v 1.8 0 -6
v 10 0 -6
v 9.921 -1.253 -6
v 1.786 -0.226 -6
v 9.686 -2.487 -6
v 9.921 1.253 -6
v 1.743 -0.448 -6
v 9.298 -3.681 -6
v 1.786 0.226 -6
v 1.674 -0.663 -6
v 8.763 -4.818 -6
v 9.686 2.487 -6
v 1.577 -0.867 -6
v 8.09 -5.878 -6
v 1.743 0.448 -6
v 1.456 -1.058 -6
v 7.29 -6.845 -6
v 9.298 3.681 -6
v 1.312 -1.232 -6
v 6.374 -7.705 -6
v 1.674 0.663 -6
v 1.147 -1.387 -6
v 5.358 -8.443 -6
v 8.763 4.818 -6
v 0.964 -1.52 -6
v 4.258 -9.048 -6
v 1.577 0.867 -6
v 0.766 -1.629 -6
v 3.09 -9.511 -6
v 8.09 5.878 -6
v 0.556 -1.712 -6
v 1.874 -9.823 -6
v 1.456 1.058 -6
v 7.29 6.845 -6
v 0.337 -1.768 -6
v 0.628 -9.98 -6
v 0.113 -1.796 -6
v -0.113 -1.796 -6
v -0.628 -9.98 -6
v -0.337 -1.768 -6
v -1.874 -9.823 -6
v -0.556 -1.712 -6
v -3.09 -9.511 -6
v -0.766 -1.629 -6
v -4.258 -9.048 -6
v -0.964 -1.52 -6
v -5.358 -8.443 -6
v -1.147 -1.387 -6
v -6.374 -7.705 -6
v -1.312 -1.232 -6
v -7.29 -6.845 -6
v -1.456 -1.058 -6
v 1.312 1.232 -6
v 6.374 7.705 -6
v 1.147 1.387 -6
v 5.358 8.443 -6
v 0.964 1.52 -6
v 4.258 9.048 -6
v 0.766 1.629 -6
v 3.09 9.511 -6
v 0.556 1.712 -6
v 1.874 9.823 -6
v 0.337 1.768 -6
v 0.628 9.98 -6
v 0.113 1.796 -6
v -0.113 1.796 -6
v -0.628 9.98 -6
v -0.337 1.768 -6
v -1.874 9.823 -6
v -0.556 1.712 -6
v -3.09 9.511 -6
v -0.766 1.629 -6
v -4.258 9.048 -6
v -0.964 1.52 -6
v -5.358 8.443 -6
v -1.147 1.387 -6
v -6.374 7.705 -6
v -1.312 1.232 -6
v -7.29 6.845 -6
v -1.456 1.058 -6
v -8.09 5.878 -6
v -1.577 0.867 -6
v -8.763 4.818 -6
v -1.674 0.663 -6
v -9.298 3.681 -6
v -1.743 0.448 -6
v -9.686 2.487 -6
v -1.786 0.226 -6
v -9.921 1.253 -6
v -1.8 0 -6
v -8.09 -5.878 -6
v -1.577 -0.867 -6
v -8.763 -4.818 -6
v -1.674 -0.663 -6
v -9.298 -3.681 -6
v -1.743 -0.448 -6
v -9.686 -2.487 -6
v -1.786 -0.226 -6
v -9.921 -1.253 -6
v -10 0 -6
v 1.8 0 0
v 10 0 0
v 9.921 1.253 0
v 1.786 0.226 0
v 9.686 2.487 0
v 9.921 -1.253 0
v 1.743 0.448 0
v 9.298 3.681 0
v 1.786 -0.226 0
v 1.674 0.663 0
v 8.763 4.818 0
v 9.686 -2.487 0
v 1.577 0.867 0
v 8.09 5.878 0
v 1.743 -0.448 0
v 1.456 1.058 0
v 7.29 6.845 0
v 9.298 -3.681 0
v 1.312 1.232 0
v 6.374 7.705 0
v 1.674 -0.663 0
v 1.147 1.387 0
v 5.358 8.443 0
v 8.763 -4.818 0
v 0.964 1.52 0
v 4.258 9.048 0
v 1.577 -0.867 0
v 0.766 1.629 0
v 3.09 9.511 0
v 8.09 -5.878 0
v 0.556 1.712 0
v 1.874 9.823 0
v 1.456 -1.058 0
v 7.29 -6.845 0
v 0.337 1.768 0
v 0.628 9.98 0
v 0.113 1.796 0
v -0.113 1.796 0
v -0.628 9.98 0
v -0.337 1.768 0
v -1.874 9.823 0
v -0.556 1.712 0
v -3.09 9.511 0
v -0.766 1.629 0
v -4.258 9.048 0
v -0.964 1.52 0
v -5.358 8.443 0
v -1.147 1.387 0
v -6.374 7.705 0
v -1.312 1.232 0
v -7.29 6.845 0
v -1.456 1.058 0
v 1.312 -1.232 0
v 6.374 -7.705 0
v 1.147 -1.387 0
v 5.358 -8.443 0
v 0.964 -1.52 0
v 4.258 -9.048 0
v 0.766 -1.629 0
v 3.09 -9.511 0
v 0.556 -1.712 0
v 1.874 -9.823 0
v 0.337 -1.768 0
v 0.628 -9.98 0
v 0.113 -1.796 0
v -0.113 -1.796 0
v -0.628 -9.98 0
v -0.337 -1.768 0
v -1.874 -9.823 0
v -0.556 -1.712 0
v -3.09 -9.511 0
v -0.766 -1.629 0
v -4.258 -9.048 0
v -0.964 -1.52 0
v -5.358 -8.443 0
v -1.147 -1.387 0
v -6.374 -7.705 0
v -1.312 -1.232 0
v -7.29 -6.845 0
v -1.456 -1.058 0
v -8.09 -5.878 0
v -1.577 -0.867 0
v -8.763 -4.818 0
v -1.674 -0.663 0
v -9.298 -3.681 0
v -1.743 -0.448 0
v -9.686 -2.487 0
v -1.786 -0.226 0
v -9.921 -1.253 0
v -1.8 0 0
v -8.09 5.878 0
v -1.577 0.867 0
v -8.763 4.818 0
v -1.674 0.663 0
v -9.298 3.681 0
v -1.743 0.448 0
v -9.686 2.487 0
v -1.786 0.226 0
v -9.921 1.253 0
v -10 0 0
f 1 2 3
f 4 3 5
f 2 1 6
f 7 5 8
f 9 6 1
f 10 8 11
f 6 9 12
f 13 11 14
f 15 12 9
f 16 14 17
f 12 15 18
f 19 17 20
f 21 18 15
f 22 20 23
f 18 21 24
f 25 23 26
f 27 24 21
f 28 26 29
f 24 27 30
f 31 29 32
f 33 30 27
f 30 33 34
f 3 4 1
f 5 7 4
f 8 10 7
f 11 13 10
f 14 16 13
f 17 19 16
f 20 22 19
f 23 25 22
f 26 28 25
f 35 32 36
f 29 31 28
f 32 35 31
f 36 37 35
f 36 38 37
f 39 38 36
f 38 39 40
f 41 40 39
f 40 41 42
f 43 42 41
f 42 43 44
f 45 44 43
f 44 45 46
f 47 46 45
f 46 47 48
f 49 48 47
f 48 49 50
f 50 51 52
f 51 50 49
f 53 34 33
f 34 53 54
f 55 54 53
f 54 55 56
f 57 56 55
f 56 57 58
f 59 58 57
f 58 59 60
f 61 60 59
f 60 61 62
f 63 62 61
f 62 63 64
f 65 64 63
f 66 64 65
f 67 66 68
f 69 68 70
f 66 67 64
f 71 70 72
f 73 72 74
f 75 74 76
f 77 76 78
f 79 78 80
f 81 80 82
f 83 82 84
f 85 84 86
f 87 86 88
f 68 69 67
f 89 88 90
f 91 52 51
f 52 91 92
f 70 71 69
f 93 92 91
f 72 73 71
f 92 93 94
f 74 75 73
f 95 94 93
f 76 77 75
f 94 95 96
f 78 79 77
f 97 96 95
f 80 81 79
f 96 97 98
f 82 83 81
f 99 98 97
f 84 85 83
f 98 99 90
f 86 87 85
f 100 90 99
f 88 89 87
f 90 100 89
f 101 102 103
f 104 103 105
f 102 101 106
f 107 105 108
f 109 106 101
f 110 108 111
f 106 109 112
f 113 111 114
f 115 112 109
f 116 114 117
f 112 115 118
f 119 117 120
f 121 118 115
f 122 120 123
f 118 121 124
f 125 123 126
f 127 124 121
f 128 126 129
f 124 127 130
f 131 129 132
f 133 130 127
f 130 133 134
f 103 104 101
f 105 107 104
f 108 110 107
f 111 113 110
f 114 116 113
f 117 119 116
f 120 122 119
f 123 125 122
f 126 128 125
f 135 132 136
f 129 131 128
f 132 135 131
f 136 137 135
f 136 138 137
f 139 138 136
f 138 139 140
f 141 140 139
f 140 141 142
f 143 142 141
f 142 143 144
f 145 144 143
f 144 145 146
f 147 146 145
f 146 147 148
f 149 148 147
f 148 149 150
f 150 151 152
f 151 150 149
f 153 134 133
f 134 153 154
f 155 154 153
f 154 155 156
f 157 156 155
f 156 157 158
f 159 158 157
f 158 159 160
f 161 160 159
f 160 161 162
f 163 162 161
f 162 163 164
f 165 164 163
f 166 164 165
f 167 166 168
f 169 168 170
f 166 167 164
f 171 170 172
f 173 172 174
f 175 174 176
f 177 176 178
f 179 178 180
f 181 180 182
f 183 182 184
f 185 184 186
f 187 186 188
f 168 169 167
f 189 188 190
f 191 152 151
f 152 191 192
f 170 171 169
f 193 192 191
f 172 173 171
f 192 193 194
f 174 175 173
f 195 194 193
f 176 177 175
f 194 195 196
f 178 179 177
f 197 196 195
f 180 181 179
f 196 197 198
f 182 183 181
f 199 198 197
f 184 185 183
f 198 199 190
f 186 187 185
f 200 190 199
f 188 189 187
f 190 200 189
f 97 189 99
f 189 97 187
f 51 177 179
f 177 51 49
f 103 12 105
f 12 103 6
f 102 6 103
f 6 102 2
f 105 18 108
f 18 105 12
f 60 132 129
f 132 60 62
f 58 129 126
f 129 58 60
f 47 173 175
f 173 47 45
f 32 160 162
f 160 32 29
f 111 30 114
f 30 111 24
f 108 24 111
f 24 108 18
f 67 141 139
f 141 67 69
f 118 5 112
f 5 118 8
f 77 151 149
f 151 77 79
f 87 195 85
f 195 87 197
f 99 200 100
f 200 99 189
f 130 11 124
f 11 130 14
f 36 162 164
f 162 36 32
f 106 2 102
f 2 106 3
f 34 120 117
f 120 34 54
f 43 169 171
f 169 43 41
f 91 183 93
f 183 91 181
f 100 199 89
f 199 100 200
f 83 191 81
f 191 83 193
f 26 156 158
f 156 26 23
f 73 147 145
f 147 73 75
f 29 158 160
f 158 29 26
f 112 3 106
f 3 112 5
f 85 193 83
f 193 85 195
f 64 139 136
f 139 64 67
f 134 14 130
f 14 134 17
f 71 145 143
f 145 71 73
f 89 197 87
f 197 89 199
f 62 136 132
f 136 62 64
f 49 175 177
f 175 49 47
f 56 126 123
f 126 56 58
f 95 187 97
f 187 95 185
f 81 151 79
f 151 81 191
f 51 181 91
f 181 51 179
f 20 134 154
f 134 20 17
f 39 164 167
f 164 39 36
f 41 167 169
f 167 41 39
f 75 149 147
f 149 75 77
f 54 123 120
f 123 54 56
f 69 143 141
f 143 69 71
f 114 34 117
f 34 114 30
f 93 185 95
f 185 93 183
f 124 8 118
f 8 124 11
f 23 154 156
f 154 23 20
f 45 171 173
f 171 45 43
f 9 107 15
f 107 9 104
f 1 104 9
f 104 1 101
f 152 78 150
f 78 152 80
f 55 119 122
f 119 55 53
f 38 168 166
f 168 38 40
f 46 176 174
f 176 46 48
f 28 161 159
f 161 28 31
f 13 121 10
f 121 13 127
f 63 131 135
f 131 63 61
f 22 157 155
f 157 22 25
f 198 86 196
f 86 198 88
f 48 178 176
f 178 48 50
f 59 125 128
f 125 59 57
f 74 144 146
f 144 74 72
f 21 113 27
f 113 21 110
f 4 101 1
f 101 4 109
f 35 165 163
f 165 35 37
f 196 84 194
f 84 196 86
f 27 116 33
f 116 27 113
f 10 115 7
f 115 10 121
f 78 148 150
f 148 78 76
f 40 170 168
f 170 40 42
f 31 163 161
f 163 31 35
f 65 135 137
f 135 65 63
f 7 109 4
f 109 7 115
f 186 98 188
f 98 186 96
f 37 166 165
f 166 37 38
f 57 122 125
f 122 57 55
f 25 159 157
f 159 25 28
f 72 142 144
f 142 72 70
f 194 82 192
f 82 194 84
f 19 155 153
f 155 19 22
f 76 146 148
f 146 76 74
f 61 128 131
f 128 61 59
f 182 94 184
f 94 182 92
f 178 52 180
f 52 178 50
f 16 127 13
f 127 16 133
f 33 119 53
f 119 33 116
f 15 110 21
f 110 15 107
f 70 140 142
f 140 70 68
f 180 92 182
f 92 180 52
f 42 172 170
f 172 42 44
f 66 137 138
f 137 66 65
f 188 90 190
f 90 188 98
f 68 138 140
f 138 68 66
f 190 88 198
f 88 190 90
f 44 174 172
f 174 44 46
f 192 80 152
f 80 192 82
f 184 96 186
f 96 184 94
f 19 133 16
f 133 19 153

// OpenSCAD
$fn = 50;


difference() {
	union() {
		translate(v = [0, 0, -6.0000000000]) {
			cylinder(h = 6, r = 7.0000000000);
		}
		translate(v = [0, 0, -6.0000000000]) {
			cylinder(h = 6, r = 10.0000000000);
		}
	}
	union() {
		#translate(v = [0, 0, -6]) {
			cylinder(h = 6, r = 1.8000000000);
		}
	}
}
